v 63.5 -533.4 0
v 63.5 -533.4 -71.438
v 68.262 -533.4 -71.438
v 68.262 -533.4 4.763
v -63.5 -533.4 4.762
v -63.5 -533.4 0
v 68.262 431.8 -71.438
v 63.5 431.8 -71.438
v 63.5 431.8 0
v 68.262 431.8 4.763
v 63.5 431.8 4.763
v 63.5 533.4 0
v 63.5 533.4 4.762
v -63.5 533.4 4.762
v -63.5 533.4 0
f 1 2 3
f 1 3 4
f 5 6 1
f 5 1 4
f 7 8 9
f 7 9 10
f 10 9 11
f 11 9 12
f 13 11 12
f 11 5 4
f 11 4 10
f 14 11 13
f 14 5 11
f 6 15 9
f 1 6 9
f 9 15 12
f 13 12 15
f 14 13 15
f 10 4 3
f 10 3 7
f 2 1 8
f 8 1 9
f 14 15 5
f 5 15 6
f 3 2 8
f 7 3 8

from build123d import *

# Parameters (mm, degrees)
F1_DEPTH = 4.7625
F2_W     = 965.2
F2_H     = 76.2
F3_DEPTH = 4.7625


with BuildPart() as f1:
    # F0 (on Top) → F1 (new body)
    with BuildSketch(Plane.XY):
        Polygon((63.5, -381), (63.5, 533.4), (-63.5, 533.4), (-63.5, -533.4), (63.5, -533.4), align=None)
    extrude(amount=F1_DEPTH)

    # F2 (on face) → F3 (join)
    with BuildSketch(Plane.YZ.offset(63.5)):
        with Locations((-50.8, -33.3375)):
            Rectangle(F2_W, F2_H)
    extrude(amount=F3_DEPTH)


solid = f1.part
